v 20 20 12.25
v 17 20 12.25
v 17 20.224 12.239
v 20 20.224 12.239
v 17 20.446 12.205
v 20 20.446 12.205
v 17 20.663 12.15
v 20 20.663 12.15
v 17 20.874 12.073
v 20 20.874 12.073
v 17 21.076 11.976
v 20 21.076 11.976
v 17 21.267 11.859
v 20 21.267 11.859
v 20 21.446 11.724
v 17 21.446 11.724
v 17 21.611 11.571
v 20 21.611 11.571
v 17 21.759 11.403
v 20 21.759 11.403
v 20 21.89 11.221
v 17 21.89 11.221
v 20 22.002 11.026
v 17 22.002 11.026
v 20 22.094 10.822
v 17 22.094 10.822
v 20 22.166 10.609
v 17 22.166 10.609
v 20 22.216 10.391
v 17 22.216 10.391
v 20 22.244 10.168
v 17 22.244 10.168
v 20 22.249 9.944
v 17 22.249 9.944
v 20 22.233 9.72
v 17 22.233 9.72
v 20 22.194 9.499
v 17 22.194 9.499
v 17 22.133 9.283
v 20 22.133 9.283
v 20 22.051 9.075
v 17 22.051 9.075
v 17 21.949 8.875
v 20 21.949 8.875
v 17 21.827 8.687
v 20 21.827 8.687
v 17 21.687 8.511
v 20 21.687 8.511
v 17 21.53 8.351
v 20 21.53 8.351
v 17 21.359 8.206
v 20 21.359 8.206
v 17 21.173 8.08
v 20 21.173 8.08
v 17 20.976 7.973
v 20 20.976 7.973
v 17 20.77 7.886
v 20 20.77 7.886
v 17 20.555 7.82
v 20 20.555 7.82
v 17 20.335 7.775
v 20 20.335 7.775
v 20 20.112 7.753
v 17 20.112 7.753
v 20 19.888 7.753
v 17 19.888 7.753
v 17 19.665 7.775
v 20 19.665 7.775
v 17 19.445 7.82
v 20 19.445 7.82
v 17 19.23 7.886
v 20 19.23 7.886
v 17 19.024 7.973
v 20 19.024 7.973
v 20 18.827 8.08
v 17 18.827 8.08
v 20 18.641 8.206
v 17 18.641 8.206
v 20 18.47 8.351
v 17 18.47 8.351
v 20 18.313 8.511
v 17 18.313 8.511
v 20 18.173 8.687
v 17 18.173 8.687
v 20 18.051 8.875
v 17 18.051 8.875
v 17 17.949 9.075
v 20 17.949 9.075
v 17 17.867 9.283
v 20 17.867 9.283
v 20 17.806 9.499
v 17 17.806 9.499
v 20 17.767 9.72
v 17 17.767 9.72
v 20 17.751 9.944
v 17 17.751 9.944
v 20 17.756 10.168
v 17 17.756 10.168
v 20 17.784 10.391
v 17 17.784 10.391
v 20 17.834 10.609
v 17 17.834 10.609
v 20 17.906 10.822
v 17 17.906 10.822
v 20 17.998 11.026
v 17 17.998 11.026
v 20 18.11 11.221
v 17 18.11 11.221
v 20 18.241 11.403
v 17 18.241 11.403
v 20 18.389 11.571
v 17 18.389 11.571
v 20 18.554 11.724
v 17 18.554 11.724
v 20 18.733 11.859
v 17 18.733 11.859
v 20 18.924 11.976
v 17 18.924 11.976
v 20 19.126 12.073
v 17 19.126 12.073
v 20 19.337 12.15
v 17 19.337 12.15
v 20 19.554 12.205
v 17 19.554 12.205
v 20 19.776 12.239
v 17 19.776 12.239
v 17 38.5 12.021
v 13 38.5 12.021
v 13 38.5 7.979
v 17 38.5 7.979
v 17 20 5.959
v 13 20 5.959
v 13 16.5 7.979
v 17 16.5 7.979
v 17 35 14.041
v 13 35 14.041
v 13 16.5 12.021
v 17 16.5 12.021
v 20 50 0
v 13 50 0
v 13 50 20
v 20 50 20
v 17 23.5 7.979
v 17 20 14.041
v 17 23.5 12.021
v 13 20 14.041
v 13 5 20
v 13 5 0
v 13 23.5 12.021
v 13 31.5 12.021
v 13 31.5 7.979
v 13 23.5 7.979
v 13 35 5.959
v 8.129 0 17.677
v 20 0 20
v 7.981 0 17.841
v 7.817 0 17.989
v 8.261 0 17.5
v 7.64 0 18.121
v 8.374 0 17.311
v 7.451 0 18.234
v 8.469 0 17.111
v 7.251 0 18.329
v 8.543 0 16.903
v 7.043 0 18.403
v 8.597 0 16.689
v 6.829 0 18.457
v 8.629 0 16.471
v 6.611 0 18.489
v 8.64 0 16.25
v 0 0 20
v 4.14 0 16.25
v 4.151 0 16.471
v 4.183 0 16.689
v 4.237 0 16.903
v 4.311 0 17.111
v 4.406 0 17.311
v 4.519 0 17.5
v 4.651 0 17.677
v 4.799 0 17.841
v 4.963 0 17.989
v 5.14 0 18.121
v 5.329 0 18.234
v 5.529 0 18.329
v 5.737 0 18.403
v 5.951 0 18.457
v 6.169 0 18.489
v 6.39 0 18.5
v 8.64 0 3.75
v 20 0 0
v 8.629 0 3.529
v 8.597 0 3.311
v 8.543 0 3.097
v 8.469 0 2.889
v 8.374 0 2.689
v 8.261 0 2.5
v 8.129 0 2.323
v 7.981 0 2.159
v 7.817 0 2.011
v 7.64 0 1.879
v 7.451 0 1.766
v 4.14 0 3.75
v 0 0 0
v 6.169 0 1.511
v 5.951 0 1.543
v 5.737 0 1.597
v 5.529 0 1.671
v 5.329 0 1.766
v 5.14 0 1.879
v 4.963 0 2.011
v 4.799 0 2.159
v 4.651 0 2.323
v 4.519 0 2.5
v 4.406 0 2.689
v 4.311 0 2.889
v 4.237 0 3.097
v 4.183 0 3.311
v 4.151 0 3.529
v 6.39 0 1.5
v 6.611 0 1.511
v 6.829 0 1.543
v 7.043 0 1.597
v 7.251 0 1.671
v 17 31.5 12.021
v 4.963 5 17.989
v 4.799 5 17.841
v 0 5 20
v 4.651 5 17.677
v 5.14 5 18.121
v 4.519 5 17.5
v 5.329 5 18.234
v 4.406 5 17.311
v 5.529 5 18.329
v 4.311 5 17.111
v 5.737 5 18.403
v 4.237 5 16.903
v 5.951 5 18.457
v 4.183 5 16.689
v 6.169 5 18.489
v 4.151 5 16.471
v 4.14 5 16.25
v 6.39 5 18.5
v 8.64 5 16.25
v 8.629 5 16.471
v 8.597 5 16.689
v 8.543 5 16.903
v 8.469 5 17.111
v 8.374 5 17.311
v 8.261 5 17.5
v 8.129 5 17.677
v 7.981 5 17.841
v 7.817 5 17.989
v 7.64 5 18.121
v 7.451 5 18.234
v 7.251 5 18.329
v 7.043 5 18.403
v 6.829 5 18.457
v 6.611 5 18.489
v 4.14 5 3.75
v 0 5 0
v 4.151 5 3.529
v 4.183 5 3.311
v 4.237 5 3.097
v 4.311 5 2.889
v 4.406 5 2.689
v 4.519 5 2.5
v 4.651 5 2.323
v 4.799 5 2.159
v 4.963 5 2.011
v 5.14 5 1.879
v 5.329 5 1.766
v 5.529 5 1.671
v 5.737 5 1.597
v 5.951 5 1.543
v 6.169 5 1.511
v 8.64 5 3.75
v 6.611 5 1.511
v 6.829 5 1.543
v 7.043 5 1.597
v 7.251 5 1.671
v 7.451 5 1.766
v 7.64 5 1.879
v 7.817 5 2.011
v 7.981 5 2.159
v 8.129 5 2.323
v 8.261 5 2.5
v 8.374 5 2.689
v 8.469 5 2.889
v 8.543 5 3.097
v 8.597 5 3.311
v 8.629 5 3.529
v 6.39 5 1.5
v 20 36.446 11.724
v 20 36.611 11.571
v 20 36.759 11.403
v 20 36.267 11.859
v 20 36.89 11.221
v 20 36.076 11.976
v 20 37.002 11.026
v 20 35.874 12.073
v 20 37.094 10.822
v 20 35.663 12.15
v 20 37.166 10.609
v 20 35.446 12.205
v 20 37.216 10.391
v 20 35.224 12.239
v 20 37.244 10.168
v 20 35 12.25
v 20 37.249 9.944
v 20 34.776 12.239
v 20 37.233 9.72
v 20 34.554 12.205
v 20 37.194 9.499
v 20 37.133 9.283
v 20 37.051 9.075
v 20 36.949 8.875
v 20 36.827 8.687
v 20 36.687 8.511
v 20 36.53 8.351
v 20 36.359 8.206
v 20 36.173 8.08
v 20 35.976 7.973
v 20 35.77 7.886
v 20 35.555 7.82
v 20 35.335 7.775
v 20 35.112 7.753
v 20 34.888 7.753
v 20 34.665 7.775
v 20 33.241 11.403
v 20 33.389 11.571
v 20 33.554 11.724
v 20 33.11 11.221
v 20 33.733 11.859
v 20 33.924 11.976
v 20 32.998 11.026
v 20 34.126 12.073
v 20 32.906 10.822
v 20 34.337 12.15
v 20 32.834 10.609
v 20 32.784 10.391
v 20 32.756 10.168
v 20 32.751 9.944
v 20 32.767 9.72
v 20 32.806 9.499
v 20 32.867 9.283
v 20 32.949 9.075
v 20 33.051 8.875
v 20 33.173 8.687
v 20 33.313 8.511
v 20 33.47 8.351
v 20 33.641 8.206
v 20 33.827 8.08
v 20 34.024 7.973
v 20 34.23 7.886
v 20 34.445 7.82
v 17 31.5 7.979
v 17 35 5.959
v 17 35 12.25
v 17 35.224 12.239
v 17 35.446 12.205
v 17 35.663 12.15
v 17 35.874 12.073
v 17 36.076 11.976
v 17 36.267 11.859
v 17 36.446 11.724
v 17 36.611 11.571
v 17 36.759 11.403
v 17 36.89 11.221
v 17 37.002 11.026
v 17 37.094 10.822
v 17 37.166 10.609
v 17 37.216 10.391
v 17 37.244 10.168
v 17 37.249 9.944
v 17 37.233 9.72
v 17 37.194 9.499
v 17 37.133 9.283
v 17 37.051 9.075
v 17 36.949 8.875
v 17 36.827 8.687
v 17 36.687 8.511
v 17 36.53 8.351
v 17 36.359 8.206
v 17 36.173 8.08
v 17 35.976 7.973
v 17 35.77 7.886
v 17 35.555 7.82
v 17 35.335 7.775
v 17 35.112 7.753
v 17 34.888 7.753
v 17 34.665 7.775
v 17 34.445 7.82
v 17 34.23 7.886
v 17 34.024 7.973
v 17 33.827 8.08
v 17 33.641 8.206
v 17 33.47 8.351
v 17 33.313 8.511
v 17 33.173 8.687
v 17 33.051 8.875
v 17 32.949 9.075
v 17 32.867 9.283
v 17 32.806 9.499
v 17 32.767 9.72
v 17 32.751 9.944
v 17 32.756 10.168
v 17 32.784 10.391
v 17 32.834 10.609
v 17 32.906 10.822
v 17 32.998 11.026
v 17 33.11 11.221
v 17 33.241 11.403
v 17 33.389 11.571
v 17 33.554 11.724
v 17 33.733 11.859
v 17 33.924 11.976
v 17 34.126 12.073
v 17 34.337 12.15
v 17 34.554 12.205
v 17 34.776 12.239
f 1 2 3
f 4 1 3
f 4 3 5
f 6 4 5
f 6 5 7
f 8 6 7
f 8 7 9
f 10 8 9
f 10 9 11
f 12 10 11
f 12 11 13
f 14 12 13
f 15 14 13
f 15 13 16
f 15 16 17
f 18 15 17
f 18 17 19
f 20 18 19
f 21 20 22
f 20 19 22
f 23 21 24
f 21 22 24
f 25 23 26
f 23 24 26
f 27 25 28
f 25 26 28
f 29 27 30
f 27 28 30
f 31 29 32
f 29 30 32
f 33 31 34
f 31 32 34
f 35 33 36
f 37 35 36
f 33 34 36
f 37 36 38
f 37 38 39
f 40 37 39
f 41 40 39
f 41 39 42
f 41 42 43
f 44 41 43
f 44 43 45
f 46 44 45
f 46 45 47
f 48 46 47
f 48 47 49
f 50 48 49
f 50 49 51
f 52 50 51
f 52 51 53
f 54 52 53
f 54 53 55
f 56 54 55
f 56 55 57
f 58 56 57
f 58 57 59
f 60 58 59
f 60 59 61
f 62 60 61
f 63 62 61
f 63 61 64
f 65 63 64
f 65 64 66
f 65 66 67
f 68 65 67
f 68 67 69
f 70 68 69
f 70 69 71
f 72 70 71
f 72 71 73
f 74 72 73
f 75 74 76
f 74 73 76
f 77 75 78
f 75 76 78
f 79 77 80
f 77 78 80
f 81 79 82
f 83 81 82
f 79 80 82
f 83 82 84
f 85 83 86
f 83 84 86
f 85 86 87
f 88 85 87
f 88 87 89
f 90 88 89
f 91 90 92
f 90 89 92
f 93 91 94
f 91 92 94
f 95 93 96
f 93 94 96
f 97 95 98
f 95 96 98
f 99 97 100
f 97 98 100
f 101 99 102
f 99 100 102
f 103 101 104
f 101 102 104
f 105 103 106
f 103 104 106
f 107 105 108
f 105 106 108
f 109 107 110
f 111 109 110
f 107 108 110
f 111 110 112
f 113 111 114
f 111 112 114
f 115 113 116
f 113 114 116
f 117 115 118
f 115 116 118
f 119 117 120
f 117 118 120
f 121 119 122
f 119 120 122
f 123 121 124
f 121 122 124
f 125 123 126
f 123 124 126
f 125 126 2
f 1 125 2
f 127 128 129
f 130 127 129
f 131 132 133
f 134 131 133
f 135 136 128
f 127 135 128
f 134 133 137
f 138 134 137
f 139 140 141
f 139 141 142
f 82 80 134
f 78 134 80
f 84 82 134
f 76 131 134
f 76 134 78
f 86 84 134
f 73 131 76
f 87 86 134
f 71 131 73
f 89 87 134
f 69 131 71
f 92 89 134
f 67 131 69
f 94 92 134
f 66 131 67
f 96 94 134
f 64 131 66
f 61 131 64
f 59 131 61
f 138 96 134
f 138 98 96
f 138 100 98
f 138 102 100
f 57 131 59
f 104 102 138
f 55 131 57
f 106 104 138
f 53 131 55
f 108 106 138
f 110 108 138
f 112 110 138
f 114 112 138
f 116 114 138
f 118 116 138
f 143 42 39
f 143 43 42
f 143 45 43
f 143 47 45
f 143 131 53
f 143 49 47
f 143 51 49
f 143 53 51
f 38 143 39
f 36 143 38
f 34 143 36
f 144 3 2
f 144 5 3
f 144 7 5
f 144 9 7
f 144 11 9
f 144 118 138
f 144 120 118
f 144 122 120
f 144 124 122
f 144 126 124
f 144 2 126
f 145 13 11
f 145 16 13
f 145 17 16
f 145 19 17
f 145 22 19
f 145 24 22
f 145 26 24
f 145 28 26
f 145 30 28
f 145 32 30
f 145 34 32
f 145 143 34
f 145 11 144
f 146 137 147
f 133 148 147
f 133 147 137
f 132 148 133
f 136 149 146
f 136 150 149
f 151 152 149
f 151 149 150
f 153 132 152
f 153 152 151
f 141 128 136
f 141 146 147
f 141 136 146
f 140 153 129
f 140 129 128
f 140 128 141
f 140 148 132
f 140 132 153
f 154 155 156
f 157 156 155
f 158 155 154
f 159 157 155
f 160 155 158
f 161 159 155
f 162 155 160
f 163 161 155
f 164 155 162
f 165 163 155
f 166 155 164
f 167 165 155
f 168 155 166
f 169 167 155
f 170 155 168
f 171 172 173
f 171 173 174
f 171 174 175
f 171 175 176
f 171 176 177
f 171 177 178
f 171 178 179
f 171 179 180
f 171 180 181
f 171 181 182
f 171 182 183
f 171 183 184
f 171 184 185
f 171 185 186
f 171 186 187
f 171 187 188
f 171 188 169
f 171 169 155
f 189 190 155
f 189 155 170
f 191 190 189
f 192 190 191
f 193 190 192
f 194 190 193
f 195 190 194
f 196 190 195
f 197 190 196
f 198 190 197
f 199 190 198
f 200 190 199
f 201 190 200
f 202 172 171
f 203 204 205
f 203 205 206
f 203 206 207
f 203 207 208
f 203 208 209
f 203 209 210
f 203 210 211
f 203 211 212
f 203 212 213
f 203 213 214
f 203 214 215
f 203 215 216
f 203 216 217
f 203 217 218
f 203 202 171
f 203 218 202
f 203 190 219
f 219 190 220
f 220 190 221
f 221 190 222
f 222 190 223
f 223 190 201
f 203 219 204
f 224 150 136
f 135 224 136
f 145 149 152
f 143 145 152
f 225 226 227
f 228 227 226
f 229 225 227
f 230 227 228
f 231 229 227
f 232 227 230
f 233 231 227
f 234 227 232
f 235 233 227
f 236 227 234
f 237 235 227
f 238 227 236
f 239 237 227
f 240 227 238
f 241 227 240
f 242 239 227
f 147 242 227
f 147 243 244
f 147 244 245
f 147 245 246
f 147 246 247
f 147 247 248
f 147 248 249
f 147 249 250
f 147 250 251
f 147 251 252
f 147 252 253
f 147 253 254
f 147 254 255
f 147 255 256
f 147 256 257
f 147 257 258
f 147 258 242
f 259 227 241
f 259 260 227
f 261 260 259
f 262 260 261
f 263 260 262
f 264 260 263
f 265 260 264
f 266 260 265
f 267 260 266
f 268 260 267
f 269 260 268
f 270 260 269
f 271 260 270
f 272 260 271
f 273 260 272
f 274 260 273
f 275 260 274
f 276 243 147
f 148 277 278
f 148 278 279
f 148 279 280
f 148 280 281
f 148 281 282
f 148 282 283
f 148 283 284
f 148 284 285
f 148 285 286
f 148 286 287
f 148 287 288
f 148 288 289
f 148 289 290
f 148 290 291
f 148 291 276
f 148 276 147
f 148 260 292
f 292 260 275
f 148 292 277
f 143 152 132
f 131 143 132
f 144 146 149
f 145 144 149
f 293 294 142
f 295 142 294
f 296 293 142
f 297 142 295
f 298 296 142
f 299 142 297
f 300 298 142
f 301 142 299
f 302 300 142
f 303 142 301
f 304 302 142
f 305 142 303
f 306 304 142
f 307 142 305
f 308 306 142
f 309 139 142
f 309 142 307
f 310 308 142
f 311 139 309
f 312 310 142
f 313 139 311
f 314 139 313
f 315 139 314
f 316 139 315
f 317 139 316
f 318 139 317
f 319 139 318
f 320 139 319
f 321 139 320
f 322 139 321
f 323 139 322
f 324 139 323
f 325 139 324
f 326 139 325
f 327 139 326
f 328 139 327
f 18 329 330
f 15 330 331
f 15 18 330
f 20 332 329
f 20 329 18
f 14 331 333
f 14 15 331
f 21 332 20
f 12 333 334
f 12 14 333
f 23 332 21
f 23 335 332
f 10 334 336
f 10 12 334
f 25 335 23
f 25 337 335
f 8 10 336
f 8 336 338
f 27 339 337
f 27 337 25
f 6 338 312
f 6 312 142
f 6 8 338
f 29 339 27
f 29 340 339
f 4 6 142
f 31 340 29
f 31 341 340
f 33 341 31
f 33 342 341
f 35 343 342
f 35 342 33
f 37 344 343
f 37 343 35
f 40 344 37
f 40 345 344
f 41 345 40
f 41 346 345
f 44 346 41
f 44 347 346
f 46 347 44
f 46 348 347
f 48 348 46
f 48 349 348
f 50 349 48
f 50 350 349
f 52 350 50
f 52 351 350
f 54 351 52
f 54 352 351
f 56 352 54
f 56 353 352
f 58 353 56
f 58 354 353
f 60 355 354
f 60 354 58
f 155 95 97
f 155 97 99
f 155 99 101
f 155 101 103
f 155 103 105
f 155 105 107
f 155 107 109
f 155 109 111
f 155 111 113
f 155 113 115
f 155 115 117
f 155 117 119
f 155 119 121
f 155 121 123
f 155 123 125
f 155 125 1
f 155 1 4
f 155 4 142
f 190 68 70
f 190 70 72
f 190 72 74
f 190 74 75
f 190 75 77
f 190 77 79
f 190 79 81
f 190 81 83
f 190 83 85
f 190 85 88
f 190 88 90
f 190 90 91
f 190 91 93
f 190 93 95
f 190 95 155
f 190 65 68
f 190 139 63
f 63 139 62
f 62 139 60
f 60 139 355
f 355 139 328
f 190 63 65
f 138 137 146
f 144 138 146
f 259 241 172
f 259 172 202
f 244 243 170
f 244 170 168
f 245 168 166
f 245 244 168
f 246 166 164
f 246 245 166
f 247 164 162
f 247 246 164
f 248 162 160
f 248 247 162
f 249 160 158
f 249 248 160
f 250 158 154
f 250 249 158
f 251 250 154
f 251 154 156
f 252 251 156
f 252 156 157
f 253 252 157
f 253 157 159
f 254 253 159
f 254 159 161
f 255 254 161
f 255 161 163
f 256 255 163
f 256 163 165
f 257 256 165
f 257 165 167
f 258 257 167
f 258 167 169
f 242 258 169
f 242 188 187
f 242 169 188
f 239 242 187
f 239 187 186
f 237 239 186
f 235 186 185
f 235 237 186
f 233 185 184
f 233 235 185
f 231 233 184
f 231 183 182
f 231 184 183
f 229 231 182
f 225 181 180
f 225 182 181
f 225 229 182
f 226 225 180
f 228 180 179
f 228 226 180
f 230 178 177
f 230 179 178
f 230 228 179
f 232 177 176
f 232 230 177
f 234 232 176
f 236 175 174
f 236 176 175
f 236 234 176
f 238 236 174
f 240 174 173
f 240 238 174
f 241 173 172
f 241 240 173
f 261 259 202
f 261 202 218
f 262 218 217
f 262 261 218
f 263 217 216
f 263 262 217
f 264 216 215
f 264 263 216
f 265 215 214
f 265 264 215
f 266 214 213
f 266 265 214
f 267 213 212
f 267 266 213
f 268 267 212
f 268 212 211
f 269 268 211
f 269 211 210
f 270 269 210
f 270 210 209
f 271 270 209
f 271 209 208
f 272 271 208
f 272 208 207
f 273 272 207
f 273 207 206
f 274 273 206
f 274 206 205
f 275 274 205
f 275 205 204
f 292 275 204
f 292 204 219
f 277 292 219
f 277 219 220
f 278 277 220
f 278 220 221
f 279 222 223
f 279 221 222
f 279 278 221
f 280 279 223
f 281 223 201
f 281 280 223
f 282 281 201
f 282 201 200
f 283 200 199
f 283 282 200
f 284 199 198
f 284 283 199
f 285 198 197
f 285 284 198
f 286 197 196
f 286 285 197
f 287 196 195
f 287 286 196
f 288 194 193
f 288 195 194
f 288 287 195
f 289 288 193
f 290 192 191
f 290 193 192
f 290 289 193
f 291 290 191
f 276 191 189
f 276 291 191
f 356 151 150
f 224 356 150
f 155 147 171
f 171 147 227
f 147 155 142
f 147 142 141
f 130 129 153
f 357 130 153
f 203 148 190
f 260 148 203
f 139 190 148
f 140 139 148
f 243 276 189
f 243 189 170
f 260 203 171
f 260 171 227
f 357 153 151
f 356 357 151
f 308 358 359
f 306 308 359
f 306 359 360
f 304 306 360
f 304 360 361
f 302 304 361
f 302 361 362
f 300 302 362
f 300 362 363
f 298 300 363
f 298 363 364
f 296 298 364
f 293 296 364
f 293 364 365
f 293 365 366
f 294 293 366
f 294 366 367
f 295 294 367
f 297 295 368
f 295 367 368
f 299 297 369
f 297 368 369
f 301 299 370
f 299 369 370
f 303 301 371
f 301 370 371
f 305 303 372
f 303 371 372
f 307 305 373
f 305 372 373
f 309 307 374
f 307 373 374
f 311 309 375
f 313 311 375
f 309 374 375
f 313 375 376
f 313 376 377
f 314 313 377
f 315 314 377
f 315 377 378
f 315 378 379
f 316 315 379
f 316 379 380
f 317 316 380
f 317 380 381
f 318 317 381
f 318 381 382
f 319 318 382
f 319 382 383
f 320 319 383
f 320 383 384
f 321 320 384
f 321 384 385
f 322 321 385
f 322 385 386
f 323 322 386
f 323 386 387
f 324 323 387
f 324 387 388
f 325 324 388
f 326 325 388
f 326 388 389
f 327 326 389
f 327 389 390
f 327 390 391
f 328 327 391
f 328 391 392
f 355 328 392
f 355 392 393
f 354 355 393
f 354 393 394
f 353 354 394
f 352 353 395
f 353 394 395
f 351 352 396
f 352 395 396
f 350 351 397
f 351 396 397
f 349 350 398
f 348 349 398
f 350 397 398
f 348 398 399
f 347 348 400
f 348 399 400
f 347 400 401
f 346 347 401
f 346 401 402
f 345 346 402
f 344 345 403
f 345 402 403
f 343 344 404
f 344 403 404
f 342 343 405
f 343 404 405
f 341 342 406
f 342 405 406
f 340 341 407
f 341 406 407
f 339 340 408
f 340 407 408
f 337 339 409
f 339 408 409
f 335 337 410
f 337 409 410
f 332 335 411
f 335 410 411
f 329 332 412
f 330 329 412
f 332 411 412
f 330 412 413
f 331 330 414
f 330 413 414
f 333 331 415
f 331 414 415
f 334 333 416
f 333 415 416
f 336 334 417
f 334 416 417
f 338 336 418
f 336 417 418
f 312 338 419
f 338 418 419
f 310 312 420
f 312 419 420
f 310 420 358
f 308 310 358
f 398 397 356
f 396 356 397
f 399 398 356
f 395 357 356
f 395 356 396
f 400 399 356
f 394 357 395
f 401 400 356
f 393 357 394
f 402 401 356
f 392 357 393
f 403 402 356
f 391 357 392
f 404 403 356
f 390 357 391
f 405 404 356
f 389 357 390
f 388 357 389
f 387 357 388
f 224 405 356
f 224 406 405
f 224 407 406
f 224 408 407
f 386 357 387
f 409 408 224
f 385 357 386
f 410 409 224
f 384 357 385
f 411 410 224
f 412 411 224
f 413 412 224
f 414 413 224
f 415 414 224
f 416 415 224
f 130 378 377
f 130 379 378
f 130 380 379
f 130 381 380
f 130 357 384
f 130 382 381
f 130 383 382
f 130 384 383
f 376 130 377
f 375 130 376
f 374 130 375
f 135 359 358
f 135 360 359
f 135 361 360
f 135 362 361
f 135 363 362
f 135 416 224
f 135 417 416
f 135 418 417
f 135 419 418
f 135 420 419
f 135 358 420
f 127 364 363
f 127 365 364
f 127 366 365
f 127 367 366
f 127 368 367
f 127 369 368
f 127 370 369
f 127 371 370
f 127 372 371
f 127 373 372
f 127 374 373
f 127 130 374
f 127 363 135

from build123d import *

# Parameters (mm, degrees)
RESSALTO_EXTRUS_O1_DEPTH = 20
CORTE_EXTRUS_O1_DEPTH    = 54.150729064
ESBO_O3_R                = 2.25
CORTE_EXTRUS_O2_DEPTH    = 56.398555938
ESBO_O3_3_R              = 2.25
CUT_EXTRUDE1_DEPTH       = 4


with BuildPart() as part:
    # Esboço1 → Ressalto-extrusão1 (new body)
    with BuildSketch(Plane.XY):
        Polygon((0, 0), (0, 5), (13, 5), (13, 50), (20, 50), (20, 0), align=None)
    extrude(amount=RESSALTO_EXTRUS_O1_DEPTH)

    # Esboço2 → Corte-extrusão1 (cut, through all)
    with BuildSketch(Plane(origin=(0, 5, 0), x_dir=(1, 0, 0), z_dir=(0, 1, 0))):
        with BuildLine():
            Line((8.64, -3.75), (8.64, -16.25))
            ThreePointArc((8.64, -16.25), (6.39, -18.5), (4.14, -16.25))
            Line((4.14, -16.25), (4.14, -3.75))
            ThreePointArc((4.14, -3.75), (6.39, -1.5), (8.64, -3.75))
        make_face()
    extrude(amount=-CORTE_EXTRUS_O1_DEPTH, mode=Mode.SUBTRACT)

    # Esboço3 → Corte-extrusão2 (cut, through all)
    with BuildSketch(Plane.ZY.offset(-13)):
        with Locations((10, 35)):
            Circle(ESBO_O3_R)
        with Locations((10, 20)):
            Circle(ESBO_O3_R)
    extrude(amount=-CORTE_EXTRUS_O2_DEPTH, mode=Mode.SUBTRACT)

    # Esboço3<3> → Cut-Extrude1 (cut)
    # profile 1 of 2: a face of its own
    with BuildSketch(Plane.ZY.offset(-13)):
        Polygon((5.958548116, 20), (7.979274058, 16.5), (12.020725942, 16.5), (14.041451884, 20), (12.020725942, 23.5), (7.979274058, 23.5), align=None)
        with Locations((10, 20)):
            Circle(ESBO_O3_3_R, mode=Mode.SUBTRACT)
    # profile 2 of 2: a face of its own
    with BuildSketch(Plane.ZY.offset(-13)):
        Polygon((5.958548116, 35), (7.979274058, 31.5), (12.020725942, 31.5), (14.041451884, 35), (12.020725942, 38.5), (7.979274058, 38.5), align=None)
        with Locations((10, 35)):
            Circle(ESBO_O3_3_R, mode=Mode.SUBTRACT)
    extrude(amount=-CUT_EXTRUDE1_DEPTH, mode=Mode.SUBTRACT)


solid = part.part
